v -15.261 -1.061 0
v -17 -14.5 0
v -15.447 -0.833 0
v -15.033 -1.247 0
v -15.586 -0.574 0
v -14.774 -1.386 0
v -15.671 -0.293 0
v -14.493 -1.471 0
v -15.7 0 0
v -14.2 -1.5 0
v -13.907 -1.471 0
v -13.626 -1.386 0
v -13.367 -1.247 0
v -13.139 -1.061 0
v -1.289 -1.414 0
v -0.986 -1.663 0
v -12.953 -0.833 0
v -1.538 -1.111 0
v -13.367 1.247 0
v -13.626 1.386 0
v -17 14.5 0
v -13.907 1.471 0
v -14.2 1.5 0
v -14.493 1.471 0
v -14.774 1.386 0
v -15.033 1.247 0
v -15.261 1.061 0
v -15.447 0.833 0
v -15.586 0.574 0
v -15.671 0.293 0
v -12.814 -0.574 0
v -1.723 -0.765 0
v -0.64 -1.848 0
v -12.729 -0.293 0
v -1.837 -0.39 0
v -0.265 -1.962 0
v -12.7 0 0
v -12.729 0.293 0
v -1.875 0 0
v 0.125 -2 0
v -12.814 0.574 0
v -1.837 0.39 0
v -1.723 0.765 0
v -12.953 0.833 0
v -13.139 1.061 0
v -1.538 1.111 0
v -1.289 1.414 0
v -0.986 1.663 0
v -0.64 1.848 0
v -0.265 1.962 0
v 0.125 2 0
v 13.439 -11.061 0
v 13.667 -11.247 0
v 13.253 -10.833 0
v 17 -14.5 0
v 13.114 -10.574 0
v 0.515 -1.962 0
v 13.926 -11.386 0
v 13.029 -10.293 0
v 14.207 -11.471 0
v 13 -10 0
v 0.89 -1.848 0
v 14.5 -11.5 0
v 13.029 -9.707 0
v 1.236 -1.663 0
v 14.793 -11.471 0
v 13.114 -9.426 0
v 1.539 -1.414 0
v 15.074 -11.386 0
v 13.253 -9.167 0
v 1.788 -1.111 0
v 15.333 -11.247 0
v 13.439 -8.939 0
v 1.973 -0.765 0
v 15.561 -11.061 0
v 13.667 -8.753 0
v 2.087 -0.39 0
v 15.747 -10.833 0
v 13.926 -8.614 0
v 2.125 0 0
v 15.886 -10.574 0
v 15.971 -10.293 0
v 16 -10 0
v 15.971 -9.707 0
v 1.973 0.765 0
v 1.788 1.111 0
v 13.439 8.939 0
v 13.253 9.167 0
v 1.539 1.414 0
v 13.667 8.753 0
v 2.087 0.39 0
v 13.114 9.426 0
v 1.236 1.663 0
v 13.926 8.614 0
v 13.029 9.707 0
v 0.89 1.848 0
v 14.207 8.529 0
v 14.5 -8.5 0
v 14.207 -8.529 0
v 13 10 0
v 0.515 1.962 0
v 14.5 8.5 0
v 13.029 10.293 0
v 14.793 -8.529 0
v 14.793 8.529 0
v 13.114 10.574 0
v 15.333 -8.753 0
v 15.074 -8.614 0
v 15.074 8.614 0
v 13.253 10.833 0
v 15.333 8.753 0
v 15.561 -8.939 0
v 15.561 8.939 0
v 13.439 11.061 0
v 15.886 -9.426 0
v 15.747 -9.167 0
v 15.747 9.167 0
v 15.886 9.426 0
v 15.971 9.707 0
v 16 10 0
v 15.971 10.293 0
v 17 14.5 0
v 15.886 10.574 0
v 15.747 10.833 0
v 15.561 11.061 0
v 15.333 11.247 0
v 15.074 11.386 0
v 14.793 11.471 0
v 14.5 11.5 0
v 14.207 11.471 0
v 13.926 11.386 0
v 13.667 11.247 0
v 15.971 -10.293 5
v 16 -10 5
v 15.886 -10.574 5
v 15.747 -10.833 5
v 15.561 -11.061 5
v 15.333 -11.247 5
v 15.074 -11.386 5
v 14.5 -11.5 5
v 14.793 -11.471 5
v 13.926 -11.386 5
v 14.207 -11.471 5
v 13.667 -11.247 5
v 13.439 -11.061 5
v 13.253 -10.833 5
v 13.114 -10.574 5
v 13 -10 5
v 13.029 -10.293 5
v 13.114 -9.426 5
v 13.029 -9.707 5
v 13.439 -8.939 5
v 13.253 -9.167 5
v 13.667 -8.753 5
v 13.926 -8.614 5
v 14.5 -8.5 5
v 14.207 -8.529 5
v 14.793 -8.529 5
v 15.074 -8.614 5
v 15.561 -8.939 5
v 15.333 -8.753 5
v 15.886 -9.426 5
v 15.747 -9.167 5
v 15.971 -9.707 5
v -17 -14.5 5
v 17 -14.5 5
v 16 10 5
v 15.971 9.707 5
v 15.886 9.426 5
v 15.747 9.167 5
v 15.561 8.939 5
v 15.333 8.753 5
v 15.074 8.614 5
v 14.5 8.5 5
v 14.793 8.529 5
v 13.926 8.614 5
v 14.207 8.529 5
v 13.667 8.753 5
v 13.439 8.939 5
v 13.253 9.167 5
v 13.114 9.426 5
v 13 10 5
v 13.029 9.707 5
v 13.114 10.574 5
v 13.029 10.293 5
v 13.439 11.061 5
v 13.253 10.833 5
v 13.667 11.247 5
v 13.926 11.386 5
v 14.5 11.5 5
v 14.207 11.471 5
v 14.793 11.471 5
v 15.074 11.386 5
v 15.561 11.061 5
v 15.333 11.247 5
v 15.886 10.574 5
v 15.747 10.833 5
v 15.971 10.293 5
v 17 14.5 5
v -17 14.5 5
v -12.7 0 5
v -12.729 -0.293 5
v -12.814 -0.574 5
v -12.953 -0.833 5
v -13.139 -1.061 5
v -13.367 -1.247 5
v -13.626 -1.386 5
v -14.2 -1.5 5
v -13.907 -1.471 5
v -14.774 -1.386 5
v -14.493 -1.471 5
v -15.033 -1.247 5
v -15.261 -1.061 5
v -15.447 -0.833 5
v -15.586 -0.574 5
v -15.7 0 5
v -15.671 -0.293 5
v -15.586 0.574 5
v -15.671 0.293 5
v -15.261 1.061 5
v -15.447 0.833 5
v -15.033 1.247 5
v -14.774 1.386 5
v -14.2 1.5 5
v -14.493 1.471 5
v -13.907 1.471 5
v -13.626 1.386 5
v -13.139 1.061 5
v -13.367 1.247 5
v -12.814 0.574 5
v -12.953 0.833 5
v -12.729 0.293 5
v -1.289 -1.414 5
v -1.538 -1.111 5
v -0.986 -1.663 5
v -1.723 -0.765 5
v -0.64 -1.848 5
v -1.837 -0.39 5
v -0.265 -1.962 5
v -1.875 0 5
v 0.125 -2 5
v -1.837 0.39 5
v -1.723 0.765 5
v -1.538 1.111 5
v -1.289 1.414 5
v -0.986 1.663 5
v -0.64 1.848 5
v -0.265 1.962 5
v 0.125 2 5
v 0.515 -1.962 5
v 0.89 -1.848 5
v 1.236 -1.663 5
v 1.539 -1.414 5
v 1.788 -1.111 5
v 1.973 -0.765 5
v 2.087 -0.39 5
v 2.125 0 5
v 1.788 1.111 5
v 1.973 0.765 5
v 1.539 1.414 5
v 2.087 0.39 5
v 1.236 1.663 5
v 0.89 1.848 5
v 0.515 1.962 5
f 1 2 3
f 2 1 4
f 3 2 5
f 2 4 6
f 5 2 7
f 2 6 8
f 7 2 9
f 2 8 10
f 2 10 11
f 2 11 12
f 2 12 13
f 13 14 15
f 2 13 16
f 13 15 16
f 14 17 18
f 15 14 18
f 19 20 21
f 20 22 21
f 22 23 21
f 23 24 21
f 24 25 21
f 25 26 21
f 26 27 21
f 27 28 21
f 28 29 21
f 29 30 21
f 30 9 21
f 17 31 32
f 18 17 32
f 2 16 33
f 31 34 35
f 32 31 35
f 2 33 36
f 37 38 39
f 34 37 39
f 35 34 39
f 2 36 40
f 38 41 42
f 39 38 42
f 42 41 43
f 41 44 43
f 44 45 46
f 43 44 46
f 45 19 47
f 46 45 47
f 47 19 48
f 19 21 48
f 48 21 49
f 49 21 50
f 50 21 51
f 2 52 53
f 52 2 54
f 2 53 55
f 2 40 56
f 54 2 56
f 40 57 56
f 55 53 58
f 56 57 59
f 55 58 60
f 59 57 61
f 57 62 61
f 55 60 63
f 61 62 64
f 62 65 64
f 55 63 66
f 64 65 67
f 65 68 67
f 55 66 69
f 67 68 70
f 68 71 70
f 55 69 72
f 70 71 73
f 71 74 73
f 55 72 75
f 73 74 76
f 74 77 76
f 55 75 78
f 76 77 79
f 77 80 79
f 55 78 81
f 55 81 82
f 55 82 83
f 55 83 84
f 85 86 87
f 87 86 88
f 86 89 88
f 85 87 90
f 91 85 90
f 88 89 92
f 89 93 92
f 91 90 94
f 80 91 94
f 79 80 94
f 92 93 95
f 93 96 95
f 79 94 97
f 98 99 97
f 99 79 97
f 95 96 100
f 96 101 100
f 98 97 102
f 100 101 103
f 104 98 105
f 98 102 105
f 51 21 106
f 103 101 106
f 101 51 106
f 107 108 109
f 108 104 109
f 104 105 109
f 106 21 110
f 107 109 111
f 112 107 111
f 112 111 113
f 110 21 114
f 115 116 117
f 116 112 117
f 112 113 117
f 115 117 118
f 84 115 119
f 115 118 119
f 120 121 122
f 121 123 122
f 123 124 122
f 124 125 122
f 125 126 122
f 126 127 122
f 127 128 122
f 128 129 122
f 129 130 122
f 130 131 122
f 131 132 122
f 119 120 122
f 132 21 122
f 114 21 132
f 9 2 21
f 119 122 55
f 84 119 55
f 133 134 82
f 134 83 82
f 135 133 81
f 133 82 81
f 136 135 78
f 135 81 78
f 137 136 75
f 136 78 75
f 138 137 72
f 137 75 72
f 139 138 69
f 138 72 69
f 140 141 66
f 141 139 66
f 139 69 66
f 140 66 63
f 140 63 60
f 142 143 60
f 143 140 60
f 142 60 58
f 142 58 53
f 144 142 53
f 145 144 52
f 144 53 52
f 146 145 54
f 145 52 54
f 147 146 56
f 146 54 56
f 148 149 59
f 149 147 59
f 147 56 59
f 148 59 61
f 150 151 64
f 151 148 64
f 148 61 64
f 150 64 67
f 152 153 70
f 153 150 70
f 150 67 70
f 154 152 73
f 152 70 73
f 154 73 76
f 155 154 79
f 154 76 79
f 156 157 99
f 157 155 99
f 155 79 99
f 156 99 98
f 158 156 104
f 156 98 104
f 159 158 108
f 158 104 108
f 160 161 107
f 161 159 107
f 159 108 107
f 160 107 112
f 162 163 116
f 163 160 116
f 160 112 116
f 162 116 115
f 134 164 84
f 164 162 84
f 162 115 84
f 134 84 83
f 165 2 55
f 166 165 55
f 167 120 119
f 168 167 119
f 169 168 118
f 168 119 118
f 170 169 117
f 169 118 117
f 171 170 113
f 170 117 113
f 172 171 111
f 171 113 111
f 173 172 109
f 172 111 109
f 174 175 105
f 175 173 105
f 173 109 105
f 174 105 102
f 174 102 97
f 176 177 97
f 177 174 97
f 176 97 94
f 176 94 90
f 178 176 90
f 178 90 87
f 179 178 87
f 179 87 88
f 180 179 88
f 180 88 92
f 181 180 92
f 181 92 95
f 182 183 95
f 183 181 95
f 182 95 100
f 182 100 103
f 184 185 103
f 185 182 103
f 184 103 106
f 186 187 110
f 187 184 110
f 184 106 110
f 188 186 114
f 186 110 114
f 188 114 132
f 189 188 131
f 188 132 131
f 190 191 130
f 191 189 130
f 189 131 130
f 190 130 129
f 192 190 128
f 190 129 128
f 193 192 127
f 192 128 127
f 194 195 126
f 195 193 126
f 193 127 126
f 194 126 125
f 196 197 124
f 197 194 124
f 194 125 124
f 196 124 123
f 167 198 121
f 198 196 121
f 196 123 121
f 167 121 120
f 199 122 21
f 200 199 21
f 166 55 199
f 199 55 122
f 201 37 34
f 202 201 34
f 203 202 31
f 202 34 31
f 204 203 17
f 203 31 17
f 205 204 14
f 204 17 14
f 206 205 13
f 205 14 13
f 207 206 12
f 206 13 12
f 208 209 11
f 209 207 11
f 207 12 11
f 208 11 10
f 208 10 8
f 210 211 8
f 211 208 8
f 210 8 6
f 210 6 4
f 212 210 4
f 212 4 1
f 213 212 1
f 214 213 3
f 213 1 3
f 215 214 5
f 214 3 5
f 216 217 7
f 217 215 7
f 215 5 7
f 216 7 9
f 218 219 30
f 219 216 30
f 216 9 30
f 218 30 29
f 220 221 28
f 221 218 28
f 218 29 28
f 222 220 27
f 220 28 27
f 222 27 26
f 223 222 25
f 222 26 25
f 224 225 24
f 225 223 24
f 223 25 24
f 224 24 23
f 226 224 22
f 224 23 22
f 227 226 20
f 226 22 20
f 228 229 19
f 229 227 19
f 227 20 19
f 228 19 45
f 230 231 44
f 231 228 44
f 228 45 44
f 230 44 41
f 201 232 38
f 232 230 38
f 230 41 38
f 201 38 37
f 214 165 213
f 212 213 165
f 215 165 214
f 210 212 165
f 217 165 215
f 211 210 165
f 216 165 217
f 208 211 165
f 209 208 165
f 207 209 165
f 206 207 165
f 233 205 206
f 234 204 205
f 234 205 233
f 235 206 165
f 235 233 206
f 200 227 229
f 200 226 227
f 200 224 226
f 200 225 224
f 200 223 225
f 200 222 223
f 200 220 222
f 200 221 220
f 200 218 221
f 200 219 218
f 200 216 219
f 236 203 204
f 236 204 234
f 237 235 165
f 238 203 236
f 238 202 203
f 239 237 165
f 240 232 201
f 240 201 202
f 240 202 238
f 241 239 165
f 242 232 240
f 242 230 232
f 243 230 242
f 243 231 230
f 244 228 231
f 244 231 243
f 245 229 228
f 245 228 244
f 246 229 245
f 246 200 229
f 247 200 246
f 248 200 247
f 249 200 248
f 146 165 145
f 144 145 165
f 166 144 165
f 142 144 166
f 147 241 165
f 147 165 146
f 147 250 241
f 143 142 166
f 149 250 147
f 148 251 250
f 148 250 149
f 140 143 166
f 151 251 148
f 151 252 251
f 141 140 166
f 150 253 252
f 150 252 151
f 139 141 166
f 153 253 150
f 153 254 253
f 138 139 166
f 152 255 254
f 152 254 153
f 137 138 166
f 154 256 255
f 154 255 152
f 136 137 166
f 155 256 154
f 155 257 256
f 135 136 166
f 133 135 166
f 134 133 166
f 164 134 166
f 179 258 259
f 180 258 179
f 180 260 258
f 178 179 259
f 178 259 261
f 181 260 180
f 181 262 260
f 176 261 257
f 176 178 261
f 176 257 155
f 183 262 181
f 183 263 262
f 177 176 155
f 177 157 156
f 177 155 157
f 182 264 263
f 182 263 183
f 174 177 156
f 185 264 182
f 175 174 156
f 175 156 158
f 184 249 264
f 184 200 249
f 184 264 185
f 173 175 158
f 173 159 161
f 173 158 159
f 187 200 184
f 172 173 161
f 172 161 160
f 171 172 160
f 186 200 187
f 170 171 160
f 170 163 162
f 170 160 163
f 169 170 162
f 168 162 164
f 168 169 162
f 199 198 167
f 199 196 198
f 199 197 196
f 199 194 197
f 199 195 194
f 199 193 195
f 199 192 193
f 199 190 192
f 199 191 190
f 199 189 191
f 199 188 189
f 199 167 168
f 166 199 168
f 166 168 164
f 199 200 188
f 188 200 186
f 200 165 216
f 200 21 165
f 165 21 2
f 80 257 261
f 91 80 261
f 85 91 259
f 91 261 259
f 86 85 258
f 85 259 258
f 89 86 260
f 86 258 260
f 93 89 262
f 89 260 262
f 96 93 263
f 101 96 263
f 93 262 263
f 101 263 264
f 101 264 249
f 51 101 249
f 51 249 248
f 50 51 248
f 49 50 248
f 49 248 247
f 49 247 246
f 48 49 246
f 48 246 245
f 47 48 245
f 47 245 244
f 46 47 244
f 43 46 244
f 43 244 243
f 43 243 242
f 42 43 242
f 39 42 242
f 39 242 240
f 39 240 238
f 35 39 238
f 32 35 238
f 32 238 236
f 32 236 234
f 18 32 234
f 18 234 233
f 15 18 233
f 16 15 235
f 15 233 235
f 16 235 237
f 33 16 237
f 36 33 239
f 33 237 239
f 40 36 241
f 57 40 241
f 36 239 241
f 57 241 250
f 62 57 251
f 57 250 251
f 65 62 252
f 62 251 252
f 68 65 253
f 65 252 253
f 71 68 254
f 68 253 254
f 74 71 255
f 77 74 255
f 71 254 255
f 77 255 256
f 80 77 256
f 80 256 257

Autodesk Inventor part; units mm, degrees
ref_plane "YZ Plane" through (0, 0, 0) normal (1, 0, 0) x (0, 1, 0)
ref_plane "XZ Plane" through (0, 0, 0) normal (0, 1, 0) x (-1, 0, 0)
ref_plane "XY Plane" through (0, 0, 0) normal (0, 0, 1) x (1, 0, 0)
sketch "Sketch1" plane through (0, 0, 0) normal (0, 0, 1) x (1, 0, 0)
  point P0 (0, 0)
sketch "Sketch2" plane through (0, 0, 0) normal (0, 0, 1) x (1, 0, 0)
  line L0 (-17, -14.5) -> (17, -14.5)
  line L1 (17, -14.5) -> (17, 14.5)
  line L2 (17, 14.5) -> (-17, 14.5)
  line L3 (-17, 14.5) -> (-17, -14.5)
  circle A0 centre (14.5, 10) radius 1.5
  circle A1 centre (14.5, -10) radius 1.5
  circle A2 centre (-14.2, 0) radius 1.5
  point P0 (0, 0)
  dimension "d0" = 34
  dimension "d1" = 29
  dimension "d2" = 3
  dimension "d3" = 3
  dimension "d4" = 3
  dimension "d5" = 20
  dimension "d6" = 2.5
  dimension "d7" = 14.5
  dimension "d8" = 28.7
extrude "Extrusion1" add sketch "Sketch2" along normal blind 5
thread "Thread1" size "M3x0.5" class "6H" standard "ANSI Metric M Profile" length 5
thread "Thread2" size "M3x0.5" class "6H" standard "ANSI Metric M Profile" length 5
thread "Thread3" size "M3x0.5" class "6H" standard "ANSI Metric M Profile" length 5
sketch "Sketch3" plane through (0, 0, 5) normal (0, 0, 1) x (1, 0, 0)
  line L0 (-7.3481, 13.6395) -> (7.272, 13.6395) construction
  line L1 (7.272, 13.6395) -> (7.272, 4.876) construction
  line L2 (7.272, 4.876) -> (-7.3481, 4.876) construction
  line L3 (-7.3481, 4.876) -> (-7.3481, 13.6395) construction
  point P0 (0, 0)
  dimension "d0" = 34
  dimension "d1" = 29
  dimension "d2" = 3
  dimension "d3" = 3
  dimension "d4" = 3
  dimension "d5" = 20
  dimension "d6" = 2.5
  dimension "d7" = 14.5
  dimension "d8" = 28.7
sketch "Sketch4" plane through (0, 0, 5) normal (0, 0, 1) x (1, 0, 0)
  circle A0 centre (0.125, 0) radius 2
  circle A1 centre (14.5, 10) radius 1.5 projected
  circle A2 centre (-14.2, 0) radius 1.5 projected
  dimension "d18" = 4
  dimension "d21" = 14.375
extrude "Extrusion2" cut sketch "Sketch4" against normal blind 5 contours A0
thread "Thread4" size "M4x0.5" class "6H" standard "ANSI Metric M Profile" length 5
properties material "ABS Plastic"
